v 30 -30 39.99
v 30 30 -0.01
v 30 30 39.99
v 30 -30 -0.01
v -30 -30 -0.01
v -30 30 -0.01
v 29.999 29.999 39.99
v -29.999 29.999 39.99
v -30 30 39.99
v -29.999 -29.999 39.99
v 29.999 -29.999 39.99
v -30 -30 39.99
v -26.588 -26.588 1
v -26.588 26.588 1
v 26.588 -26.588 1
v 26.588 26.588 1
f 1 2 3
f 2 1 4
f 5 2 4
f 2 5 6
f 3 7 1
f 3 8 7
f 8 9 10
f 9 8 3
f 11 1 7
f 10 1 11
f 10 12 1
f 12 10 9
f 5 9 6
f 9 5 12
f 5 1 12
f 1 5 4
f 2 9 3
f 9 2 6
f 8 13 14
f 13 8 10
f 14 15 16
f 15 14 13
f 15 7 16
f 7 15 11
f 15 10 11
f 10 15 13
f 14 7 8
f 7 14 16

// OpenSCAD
outer_size = [60,60,40];//外箱のサイズ
tilt = 5;//傾斜の角度
btm_thick = 1;//底の厚み

inner_height = outer_size[2]-btm_thick;

scaling = (outer_size[0]-2*inner_height*tan(tilt))/outer_size[0]; //角度からエクストルードの縮小率を決める

translate([0,0,outer_size[2]]){
rotate([180,0,0]){
difference(){
    translate([0,0,outer_size[2]/2+0.01]){
    cube(outer_size,true);
    }//底側の箱生成
    linear_extrude(inner_height,scale=scaling){
        square(outer_size[0],true);
    }//内側に台形作って引き算
}
}
}
